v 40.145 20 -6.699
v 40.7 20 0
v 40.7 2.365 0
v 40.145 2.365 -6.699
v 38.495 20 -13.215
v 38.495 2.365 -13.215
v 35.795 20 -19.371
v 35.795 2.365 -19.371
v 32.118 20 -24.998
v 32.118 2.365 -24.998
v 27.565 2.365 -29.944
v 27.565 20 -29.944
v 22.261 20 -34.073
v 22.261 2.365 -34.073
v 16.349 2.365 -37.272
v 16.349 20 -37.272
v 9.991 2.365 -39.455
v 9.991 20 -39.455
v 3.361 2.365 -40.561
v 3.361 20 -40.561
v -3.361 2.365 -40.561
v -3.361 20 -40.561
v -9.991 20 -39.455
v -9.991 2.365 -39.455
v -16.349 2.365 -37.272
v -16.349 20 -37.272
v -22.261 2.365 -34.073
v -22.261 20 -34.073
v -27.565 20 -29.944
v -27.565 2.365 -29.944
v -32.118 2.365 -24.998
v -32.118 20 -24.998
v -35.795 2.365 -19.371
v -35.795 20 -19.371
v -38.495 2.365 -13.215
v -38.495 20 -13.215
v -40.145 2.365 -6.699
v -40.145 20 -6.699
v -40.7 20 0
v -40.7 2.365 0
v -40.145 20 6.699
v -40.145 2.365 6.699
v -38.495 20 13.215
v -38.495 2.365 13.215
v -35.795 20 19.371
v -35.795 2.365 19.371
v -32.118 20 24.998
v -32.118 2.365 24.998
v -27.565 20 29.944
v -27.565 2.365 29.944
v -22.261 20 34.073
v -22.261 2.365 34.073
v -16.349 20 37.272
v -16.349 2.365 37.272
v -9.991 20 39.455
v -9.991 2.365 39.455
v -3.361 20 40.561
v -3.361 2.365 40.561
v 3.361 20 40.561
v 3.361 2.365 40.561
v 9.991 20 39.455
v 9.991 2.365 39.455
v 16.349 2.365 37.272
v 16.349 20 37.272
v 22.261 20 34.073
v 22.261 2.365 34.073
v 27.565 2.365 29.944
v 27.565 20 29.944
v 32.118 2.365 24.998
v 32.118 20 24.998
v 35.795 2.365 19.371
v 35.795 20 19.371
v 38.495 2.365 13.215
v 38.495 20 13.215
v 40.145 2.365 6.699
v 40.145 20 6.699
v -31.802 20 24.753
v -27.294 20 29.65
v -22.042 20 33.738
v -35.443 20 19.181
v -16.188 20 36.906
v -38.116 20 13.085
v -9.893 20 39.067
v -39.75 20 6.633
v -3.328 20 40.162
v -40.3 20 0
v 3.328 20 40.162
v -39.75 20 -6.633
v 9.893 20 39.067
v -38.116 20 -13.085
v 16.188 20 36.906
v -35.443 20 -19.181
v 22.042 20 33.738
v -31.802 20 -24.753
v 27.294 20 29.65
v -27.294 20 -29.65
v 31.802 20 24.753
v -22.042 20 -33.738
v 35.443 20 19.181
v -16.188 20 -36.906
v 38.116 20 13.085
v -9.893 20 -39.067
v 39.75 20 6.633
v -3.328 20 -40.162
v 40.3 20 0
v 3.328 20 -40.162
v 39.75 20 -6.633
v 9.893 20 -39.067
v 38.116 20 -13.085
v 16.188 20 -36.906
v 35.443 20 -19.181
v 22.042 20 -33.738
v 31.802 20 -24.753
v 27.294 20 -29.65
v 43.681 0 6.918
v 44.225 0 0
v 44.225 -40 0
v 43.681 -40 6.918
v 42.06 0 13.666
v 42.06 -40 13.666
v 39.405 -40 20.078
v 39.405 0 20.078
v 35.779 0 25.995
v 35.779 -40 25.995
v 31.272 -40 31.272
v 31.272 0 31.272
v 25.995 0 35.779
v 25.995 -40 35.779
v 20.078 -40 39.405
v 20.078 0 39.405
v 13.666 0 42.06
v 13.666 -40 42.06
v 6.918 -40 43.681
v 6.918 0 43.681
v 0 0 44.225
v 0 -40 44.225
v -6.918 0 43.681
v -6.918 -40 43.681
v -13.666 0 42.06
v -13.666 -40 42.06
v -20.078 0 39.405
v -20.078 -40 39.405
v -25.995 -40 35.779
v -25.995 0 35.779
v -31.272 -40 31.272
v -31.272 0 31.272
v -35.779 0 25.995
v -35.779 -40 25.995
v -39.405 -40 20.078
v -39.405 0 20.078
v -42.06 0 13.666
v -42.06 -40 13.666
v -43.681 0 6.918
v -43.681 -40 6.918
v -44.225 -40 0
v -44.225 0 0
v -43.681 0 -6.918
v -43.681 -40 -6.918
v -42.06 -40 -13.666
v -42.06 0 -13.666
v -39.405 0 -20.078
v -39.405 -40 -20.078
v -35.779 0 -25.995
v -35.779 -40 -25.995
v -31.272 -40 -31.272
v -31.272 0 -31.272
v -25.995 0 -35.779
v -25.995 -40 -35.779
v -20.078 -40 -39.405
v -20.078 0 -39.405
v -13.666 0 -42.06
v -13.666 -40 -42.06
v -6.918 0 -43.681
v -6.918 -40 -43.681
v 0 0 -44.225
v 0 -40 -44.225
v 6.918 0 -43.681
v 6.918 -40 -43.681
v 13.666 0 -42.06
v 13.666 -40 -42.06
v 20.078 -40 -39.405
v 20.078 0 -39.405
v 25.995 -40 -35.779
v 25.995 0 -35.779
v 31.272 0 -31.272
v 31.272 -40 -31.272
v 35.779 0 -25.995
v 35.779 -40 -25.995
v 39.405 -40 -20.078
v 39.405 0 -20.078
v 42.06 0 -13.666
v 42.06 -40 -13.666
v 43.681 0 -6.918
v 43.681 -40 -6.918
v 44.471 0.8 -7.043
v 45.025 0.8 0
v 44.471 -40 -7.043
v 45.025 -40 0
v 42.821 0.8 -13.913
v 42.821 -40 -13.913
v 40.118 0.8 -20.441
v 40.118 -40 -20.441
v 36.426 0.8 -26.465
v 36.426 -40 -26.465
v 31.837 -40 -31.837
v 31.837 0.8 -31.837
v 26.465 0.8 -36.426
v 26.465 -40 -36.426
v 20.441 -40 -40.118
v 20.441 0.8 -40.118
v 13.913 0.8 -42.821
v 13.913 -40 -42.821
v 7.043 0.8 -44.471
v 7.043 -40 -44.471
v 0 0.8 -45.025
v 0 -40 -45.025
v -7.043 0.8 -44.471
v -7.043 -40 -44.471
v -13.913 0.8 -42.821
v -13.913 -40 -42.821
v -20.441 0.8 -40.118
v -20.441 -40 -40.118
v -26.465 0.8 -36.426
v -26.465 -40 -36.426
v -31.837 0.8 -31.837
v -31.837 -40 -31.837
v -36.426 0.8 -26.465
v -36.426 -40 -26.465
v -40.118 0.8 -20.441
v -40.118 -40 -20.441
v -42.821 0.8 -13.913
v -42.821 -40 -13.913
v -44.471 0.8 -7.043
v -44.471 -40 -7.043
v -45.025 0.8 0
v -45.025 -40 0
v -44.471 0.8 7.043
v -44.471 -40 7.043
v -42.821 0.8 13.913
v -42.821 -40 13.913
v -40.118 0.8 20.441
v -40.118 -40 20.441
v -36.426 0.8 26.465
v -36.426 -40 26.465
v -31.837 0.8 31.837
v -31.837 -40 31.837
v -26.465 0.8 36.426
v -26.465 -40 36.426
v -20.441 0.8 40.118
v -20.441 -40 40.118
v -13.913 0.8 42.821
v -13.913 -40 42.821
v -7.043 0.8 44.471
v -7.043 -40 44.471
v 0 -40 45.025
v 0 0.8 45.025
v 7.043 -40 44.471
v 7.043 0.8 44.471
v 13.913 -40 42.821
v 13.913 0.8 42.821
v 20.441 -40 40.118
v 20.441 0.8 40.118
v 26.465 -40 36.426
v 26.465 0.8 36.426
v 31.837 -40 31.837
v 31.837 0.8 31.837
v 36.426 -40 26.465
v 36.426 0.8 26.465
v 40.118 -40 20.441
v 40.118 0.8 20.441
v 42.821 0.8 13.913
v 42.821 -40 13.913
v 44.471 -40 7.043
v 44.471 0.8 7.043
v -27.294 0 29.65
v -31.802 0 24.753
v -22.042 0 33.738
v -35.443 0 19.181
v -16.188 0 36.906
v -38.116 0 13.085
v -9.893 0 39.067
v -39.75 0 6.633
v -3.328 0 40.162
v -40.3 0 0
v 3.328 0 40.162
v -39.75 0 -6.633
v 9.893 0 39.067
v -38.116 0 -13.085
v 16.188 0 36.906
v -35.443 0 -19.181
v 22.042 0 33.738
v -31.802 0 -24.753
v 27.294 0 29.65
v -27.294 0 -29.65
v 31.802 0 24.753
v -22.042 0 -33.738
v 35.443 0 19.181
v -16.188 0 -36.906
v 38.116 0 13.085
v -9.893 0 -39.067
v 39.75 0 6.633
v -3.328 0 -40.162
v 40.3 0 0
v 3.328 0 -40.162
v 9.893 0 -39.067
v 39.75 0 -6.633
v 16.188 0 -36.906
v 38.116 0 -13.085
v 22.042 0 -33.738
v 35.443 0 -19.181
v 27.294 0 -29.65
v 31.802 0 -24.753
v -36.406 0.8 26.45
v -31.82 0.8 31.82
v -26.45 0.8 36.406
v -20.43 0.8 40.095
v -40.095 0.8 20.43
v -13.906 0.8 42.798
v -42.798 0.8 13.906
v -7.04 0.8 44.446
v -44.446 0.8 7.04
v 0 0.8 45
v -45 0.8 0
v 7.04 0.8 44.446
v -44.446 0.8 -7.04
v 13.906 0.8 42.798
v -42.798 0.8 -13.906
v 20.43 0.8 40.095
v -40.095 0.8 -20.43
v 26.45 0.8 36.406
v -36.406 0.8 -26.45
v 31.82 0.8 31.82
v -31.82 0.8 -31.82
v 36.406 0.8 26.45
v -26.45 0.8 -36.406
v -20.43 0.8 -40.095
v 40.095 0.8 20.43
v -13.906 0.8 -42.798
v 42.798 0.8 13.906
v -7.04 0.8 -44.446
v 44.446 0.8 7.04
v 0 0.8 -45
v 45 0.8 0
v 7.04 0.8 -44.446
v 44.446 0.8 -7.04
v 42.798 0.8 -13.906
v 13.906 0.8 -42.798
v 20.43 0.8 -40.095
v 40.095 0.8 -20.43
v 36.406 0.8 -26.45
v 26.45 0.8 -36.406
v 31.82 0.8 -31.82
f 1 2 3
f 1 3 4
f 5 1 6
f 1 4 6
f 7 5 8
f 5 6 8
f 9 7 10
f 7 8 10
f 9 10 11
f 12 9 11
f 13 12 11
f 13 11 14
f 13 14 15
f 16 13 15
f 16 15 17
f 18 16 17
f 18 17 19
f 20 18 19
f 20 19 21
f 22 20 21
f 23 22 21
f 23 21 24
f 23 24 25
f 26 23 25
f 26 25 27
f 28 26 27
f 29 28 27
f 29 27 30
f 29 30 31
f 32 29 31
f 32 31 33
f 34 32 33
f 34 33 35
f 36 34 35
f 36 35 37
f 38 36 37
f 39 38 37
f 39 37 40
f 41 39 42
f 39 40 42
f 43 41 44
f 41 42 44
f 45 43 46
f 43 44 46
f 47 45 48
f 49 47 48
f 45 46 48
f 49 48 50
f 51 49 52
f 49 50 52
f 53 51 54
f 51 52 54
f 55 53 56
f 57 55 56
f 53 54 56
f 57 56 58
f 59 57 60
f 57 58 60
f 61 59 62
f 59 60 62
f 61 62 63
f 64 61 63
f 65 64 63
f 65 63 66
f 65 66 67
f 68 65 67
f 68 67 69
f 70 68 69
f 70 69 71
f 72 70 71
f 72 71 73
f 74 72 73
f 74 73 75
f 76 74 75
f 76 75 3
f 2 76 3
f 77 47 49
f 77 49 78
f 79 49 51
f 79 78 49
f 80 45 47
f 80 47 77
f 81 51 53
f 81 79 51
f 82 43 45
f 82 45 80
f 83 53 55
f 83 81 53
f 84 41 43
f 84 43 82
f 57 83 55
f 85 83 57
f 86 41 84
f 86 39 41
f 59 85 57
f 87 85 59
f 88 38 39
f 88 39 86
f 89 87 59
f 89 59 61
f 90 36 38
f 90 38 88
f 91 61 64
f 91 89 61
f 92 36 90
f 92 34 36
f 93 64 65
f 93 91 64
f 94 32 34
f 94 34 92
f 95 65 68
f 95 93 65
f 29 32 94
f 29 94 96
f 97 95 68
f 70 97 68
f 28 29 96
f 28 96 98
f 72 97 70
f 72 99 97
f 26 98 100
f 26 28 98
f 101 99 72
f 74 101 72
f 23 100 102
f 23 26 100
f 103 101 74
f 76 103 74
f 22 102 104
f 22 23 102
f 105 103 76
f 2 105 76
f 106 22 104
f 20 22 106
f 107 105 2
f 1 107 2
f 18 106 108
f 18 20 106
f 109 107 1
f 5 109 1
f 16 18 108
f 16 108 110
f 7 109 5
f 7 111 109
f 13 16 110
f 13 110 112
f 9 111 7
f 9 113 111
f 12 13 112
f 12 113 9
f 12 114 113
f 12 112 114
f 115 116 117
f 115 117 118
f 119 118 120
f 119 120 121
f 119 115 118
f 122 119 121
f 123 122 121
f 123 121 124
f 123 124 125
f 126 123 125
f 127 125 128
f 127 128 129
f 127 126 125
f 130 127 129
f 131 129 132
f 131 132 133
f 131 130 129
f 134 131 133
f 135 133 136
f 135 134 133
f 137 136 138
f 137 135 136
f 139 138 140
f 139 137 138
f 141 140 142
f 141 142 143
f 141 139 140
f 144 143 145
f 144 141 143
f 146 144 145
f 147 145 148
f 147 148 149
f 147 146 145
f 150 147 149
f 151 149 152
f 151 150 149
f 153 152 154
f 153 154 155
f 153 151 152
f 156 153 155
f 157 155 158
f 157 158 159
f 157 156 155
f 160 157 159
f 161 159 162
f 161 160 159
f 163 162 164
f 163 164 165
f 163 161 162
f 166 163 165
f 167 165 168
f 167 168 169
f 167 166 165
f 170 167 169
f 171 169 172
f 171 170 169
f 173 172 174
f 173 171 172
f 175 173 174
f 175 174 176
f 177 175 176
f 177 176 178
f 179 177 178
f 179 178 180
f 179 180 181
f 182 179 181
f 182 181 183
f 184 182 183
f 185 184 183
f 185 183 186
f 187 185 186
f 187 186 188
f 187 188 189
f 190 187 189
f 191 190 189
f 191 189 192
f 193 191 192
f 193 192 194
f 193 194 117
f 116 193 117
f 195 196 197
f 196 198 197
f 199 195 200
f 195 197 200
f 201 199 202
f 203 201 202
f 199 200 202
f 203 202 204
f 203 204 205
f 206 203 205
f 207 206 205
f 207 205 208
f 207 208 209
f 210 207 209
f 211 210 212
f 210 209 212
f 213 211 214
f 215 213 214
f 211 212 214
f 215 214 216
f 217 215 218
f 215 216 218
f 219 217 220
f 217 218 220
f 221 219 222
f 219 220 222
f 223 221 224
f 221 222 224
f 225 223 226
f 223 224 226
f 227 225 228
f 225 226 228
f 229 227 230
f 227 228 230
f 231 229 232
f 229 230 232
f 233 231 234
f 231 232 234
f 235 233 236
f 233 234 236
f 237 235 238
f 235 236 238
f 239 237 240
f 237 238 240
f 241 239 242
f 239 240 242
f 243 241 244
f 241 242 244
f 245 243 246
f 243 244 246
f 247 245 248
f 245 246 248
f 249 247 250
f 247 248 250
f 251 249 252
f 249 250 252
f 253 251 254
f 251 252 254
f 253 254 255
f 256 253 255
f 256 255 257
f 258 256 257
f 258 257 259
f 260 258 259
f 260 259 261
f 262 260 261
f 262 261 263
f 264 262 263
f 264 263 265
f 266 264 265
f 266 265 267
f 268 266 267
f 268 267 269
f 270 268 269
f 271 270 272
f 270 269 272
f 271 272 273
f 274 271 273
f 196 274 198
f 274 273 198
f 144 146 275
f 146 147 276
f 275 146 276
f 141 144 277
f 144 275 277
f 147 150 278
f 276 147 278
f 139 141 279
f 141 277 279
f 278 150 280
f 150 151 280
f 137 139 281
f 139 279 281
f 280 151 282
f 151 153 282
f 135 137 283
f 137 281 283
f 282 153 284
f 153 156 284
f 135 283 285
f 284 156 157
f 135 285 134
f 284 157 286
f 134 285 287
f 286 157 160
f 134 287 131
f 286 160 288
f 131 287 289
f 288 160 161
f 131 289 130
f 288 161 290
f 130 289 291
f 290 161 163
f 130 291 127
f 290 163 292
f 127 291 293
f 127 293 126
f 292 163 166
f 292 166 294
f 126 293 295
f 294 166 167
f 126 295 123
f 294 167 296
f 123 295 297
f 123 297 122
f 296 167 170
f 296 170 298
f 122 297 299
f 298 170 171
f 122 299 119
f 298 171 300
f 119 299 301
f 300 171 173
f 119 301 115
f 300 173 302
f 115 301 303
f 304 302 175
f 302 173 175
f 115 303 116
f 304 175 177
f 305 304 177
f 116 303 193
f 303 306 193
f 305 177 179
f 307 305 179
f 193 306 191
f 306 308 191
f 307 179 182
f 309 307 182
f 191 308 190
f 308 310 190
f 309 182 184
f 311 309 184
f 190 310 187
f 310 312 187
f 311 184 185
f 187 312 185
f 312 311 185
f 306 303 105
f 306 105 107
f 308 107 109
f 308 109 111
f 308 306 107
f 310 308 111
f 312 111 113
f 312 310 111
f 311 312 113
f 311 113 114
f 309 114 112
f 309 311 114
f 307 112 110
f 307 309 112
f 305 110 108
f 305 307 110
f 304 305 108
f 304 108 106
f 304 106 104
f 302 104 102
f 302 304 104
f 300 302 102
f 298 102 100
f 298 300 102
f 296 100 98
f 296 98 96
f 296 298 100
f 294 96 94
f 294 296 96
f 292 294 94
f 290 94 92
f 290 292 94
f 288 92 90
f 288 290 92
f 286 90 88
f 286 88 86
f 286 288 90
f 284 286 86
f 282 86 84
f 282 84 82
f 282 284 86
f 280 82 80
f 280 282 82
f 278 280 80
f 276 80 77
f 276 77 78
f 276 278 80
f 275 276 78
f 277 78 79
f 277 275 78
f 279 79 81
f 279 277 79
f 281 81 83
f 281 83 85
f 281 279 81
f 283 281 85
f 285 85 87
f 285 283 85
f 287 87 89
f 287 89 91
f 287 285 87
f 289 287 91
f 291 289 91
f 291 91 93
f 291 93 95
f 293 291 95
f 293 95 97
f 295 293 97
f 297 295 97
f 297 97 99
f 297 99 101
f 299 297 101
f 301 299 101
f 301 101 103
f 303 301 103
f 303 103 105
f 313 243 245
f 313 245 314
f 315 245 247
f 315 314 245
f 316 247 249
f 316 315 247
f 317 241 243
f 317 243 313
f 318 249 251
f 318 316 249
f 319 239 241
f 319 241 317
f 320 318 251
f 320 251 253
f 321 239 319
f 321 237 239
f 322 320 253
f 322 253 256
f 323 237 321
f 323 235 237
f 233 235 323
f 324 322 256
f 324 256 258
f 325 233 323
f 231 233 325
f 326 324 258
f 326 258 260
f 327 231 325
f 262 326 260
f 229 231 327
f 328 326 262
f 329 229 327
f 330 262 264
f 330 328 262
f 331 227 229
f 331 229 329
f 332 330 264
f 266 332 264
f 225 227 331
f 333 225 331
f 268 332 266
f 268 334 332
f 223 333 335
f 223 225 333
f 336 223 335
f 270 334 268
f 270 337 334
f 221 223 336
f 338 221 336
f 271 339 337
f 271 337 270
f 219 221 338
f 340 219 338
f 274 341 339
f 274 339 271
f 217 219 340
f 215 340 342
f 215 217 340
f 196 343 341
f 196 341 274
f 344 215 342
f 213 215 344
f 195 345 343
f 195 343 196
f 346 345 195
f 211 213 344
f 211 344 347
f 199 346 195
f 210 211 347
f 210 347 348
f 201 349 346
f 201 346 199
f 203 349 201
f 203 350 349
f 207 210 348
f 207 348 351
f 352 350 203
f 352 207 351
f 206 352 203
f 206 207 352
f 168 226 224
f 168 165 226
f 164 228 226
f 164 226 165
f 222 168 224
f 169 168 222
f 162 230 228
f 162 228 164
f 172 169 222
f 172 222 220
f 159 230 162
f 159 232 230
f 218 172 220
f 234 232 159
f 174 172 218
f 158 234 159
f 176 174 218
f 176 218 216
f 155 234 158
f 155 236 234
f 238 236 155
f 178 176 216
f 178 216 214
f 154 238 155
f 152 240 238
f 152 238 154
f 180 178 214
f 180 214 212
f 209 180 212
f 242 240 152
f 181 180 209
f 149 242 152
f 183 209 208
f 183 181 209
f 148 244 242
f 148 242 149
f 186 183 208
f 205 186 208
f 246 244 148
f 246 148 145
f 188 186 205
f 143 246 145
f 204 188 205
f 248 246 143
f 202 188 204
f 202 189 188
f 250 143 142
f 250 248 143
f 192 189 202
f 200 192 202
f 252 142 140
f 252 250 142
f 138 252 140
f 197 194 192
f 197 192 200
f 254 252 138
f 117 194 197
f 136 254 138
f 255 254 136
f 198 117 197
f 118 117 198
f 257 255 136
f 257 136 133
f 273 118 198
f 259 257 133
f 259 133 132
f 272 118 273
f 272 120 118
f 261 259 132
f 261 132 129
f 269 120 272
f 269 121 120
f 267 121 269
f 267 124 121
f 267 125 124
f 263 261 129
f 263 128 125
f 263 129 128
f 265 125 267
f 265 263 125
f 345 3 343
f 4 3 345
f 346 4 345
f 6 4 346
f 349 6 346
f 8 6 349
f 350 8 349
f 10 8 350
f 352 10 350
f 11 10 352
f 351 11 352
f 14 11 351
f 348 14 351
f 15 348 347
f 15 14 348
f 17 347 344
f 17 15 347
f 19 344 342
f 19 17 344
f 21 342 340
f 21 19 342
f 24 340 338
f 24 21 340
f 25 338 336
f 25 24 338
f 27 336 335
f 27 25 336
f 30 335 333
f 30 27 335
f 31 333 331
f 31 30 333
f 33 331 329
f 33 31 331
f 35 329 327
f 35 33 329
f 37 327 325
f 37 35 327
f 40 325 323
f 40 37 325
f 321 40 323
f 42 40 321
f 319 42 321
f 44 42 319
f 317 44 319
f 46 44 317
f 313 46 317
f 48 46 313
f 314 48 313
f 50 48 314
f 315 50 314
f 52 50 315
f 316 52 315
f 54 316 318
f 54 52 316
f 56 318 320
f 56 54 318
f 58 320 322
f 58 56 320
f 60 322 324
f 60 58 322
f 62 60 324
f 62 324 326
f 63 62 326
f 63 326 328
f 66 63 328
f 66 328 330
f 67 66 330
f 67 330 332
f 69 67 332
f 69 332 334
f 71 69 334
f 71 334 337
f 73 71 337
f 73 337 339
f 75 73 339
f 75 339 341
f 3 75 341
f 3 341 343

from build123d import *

# Parameters (mm, degrees)
SKETCH1_R           = 40.7
SKETCH1_R_2         = 40.3
BOSS_EXTRUDE1_DEPTH = 20
SKETCH2_R           = 45.025
SKETCH2_R_2         = 44.225
BOSS_EXTRUDE2_DEPTH = 40
SKETCH3_R           = 45.025
SKETCH3_R_2         = 40.7
BOSS_EXTRUDE3_DEPTH = 0.8
CHAMFER1_SIZE       = 4.3
CHAMFER1_SIZE2      = 1.565072007


with BuildPart() as part:
    # Sketch1 → Boss-Extrude1 (new body)
    with BuildSketch(Plane(origin=(0, 0, 0), x_dir=(1, 0, 0), z_dir=(0, 1, 0))):
        Circle(SKETCH1_R)
        Circle(SKETCH1_R_2, mode=Mode.SUBTRACT)
    extrude(amount=BOSS_EXTRUDE1_DEPTH)



with BuildPart() as body_2:
    # Sketch2 → Boss-Extrude2 (new body)
    with BuildSketch(Plane.XZ):
        Circle(SKETCH2_R)
        Circle(SKETCH2_R_2, mode=Mode.SUBTRACT)
    extrude(amount=BOSS_EXTRUDE2_DEPTH)


with BuildPart() as part_1:
    add(part.part)

    add(body_2.part)  # Boss-Extrude3 merges body 2
    # Sketch3 → Boss-Extrude3 (add)
    with BuildSketch(Plane(origin=(0, 0, 0), x_dir=(1, 0, 0), z_dir=(0, 1, 0))):
        Circle(SKETCH3_R)
        Circle(SKETCH3_R_2, mode=Mode.SUBTRACT)
    extrude(amount=BOSS_EXTRUDE3_DEPTH)

    # Chamfer1
    chamfer1_edges = [part_1.edges().sort_by_distance(p)[0] for p in [
        (-40.7, 0.8, 0),
    ]]
    chamfer1_side = [part_1.faces().sort_by_distance(p)[0] for p in [
        (-43.751500687, 0.8, 0),
    ]]
    chamfer(chamfer1_edges, length=CHAMFER1_SIZE, length2=CHAMFER1_SIZE2, reference=chamfer1_side[0])


solid = part_1.part
